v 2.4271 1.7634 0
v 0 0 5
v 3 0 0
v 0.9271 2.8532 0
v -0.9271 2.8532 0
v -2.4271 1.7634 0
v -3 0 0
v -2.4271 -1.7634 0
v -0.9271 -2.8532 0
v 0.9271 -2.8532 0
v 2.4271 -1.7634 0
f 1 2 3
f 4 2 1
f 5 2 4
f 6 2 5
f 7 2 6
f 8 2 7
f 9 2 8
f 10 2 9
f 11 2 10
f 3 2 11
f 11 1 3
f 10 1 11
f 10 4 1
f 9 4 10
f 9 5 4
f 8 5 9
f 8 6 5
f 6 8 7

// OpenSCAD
// Generated by SolidPython 1.0.1 on 2020-07-29 00:46:43


cylinder(h = 5, r1 = 3, r2 = 0);
/***********************************************
*********      SolidPython code:      **********
************************************************
 
# import packages: SolidPython
from solid import *
from solid.utils import *
from itertools import chain, combinations, permutations


class Resize:

    def __init__(self, scad_file):
        self.scad_file = scad_file
        #self.scad_file = import_scad(scad_file)
        # cone/cylinder param:
        self.r1 = 0
        self.r2 = 0
        self.h = 0
        # rectangular prism param:
        self.w = 0
        self.l = 0
        # ellipse param:
        self.r = 0

    # import OpenScad code (file name corresponds to shape)


    # classify shape + parameters
    def assign(self, param1, param2, param3):
        if self.scad_file == 'cone.scad':
            self.r1 = param1
            self.r2 = param2
            self.h = param3
        elif self.scad_file == 'cylinder.scad':
            self.r1 = param1
            self.r2 = param2
            self.h = param3
        elif self.scad_file == 'rectangularPrism.scad':
            self.h = param1
            self.l = param2
            self.w = param3
        else:
            self.r = param1
            self.h = param2

    # resize parameters
    def iterate(self):
        x = range(3, 20, 2)
        i = 1
        if self.scad_file == 'cone.scad':
            tempList = list(permutations(x, 2))
            for temp in tempList:
                param1 = temp[0]
                param2 = temp[1]
                filepath = 'produced_scad_files/' + 'cone' + str(param1) + '_' + str(param2) + '_' + '.scad'
                scad_render_to_file(cylinder(h=param1, r1=param2, r2=0), filepath)

        elif self.scad_file == 'cylinder.scad':
            tempList = list(permutations(x, 3))
            for temp in tempList:
                param1 = temp[0]
                param2 = temp[1]
                filepath = 'produced_scad_files/' + 'cylinder' + str(param1) + '_' + str(param2) + '_' + '.scad'
                scad_render_to_file(cylinder(h=param1, r1=param2, r2=param2), filepath)

        elif self.scad_file == 'rectangularPrism.scad':
            tempList = list(permutations(x, 3))
            for temp in tempList:
                param1 = temp[0]
                param2 = temp[1]
                param3 = temp[2]
                filepath = 'produced_scad_files/' + 'rectangularPrism' + str(param1) + '_' + str(param2) + '_' + str(
                    param3) + '.scad'
                scad_render_to_file(cube(size=(param1, param2, param3)), filepath)

        elif self.scad_file == 'ellipse.scad':
            tempList = list(permutations(x, 4))
            for temp in tempList:
                param1 = temp[0]
                param2 = temp[1]
                param3 = temp[2]
                param4 = temp[3]
                filepath = 'produced_scad_files/' + 'ellipse' + str(param1) + '_' + str(param2) + '_' + str(param3) + '_' + str(param4) + '.scad'
                scad_render_to_file(scale([param1, param2, param3])(sphere(r=param4)), filepath)

    def render_to_scadfile(self):
        scad_render_to_file(scad, 'example.scad') 
 
************************************************/
